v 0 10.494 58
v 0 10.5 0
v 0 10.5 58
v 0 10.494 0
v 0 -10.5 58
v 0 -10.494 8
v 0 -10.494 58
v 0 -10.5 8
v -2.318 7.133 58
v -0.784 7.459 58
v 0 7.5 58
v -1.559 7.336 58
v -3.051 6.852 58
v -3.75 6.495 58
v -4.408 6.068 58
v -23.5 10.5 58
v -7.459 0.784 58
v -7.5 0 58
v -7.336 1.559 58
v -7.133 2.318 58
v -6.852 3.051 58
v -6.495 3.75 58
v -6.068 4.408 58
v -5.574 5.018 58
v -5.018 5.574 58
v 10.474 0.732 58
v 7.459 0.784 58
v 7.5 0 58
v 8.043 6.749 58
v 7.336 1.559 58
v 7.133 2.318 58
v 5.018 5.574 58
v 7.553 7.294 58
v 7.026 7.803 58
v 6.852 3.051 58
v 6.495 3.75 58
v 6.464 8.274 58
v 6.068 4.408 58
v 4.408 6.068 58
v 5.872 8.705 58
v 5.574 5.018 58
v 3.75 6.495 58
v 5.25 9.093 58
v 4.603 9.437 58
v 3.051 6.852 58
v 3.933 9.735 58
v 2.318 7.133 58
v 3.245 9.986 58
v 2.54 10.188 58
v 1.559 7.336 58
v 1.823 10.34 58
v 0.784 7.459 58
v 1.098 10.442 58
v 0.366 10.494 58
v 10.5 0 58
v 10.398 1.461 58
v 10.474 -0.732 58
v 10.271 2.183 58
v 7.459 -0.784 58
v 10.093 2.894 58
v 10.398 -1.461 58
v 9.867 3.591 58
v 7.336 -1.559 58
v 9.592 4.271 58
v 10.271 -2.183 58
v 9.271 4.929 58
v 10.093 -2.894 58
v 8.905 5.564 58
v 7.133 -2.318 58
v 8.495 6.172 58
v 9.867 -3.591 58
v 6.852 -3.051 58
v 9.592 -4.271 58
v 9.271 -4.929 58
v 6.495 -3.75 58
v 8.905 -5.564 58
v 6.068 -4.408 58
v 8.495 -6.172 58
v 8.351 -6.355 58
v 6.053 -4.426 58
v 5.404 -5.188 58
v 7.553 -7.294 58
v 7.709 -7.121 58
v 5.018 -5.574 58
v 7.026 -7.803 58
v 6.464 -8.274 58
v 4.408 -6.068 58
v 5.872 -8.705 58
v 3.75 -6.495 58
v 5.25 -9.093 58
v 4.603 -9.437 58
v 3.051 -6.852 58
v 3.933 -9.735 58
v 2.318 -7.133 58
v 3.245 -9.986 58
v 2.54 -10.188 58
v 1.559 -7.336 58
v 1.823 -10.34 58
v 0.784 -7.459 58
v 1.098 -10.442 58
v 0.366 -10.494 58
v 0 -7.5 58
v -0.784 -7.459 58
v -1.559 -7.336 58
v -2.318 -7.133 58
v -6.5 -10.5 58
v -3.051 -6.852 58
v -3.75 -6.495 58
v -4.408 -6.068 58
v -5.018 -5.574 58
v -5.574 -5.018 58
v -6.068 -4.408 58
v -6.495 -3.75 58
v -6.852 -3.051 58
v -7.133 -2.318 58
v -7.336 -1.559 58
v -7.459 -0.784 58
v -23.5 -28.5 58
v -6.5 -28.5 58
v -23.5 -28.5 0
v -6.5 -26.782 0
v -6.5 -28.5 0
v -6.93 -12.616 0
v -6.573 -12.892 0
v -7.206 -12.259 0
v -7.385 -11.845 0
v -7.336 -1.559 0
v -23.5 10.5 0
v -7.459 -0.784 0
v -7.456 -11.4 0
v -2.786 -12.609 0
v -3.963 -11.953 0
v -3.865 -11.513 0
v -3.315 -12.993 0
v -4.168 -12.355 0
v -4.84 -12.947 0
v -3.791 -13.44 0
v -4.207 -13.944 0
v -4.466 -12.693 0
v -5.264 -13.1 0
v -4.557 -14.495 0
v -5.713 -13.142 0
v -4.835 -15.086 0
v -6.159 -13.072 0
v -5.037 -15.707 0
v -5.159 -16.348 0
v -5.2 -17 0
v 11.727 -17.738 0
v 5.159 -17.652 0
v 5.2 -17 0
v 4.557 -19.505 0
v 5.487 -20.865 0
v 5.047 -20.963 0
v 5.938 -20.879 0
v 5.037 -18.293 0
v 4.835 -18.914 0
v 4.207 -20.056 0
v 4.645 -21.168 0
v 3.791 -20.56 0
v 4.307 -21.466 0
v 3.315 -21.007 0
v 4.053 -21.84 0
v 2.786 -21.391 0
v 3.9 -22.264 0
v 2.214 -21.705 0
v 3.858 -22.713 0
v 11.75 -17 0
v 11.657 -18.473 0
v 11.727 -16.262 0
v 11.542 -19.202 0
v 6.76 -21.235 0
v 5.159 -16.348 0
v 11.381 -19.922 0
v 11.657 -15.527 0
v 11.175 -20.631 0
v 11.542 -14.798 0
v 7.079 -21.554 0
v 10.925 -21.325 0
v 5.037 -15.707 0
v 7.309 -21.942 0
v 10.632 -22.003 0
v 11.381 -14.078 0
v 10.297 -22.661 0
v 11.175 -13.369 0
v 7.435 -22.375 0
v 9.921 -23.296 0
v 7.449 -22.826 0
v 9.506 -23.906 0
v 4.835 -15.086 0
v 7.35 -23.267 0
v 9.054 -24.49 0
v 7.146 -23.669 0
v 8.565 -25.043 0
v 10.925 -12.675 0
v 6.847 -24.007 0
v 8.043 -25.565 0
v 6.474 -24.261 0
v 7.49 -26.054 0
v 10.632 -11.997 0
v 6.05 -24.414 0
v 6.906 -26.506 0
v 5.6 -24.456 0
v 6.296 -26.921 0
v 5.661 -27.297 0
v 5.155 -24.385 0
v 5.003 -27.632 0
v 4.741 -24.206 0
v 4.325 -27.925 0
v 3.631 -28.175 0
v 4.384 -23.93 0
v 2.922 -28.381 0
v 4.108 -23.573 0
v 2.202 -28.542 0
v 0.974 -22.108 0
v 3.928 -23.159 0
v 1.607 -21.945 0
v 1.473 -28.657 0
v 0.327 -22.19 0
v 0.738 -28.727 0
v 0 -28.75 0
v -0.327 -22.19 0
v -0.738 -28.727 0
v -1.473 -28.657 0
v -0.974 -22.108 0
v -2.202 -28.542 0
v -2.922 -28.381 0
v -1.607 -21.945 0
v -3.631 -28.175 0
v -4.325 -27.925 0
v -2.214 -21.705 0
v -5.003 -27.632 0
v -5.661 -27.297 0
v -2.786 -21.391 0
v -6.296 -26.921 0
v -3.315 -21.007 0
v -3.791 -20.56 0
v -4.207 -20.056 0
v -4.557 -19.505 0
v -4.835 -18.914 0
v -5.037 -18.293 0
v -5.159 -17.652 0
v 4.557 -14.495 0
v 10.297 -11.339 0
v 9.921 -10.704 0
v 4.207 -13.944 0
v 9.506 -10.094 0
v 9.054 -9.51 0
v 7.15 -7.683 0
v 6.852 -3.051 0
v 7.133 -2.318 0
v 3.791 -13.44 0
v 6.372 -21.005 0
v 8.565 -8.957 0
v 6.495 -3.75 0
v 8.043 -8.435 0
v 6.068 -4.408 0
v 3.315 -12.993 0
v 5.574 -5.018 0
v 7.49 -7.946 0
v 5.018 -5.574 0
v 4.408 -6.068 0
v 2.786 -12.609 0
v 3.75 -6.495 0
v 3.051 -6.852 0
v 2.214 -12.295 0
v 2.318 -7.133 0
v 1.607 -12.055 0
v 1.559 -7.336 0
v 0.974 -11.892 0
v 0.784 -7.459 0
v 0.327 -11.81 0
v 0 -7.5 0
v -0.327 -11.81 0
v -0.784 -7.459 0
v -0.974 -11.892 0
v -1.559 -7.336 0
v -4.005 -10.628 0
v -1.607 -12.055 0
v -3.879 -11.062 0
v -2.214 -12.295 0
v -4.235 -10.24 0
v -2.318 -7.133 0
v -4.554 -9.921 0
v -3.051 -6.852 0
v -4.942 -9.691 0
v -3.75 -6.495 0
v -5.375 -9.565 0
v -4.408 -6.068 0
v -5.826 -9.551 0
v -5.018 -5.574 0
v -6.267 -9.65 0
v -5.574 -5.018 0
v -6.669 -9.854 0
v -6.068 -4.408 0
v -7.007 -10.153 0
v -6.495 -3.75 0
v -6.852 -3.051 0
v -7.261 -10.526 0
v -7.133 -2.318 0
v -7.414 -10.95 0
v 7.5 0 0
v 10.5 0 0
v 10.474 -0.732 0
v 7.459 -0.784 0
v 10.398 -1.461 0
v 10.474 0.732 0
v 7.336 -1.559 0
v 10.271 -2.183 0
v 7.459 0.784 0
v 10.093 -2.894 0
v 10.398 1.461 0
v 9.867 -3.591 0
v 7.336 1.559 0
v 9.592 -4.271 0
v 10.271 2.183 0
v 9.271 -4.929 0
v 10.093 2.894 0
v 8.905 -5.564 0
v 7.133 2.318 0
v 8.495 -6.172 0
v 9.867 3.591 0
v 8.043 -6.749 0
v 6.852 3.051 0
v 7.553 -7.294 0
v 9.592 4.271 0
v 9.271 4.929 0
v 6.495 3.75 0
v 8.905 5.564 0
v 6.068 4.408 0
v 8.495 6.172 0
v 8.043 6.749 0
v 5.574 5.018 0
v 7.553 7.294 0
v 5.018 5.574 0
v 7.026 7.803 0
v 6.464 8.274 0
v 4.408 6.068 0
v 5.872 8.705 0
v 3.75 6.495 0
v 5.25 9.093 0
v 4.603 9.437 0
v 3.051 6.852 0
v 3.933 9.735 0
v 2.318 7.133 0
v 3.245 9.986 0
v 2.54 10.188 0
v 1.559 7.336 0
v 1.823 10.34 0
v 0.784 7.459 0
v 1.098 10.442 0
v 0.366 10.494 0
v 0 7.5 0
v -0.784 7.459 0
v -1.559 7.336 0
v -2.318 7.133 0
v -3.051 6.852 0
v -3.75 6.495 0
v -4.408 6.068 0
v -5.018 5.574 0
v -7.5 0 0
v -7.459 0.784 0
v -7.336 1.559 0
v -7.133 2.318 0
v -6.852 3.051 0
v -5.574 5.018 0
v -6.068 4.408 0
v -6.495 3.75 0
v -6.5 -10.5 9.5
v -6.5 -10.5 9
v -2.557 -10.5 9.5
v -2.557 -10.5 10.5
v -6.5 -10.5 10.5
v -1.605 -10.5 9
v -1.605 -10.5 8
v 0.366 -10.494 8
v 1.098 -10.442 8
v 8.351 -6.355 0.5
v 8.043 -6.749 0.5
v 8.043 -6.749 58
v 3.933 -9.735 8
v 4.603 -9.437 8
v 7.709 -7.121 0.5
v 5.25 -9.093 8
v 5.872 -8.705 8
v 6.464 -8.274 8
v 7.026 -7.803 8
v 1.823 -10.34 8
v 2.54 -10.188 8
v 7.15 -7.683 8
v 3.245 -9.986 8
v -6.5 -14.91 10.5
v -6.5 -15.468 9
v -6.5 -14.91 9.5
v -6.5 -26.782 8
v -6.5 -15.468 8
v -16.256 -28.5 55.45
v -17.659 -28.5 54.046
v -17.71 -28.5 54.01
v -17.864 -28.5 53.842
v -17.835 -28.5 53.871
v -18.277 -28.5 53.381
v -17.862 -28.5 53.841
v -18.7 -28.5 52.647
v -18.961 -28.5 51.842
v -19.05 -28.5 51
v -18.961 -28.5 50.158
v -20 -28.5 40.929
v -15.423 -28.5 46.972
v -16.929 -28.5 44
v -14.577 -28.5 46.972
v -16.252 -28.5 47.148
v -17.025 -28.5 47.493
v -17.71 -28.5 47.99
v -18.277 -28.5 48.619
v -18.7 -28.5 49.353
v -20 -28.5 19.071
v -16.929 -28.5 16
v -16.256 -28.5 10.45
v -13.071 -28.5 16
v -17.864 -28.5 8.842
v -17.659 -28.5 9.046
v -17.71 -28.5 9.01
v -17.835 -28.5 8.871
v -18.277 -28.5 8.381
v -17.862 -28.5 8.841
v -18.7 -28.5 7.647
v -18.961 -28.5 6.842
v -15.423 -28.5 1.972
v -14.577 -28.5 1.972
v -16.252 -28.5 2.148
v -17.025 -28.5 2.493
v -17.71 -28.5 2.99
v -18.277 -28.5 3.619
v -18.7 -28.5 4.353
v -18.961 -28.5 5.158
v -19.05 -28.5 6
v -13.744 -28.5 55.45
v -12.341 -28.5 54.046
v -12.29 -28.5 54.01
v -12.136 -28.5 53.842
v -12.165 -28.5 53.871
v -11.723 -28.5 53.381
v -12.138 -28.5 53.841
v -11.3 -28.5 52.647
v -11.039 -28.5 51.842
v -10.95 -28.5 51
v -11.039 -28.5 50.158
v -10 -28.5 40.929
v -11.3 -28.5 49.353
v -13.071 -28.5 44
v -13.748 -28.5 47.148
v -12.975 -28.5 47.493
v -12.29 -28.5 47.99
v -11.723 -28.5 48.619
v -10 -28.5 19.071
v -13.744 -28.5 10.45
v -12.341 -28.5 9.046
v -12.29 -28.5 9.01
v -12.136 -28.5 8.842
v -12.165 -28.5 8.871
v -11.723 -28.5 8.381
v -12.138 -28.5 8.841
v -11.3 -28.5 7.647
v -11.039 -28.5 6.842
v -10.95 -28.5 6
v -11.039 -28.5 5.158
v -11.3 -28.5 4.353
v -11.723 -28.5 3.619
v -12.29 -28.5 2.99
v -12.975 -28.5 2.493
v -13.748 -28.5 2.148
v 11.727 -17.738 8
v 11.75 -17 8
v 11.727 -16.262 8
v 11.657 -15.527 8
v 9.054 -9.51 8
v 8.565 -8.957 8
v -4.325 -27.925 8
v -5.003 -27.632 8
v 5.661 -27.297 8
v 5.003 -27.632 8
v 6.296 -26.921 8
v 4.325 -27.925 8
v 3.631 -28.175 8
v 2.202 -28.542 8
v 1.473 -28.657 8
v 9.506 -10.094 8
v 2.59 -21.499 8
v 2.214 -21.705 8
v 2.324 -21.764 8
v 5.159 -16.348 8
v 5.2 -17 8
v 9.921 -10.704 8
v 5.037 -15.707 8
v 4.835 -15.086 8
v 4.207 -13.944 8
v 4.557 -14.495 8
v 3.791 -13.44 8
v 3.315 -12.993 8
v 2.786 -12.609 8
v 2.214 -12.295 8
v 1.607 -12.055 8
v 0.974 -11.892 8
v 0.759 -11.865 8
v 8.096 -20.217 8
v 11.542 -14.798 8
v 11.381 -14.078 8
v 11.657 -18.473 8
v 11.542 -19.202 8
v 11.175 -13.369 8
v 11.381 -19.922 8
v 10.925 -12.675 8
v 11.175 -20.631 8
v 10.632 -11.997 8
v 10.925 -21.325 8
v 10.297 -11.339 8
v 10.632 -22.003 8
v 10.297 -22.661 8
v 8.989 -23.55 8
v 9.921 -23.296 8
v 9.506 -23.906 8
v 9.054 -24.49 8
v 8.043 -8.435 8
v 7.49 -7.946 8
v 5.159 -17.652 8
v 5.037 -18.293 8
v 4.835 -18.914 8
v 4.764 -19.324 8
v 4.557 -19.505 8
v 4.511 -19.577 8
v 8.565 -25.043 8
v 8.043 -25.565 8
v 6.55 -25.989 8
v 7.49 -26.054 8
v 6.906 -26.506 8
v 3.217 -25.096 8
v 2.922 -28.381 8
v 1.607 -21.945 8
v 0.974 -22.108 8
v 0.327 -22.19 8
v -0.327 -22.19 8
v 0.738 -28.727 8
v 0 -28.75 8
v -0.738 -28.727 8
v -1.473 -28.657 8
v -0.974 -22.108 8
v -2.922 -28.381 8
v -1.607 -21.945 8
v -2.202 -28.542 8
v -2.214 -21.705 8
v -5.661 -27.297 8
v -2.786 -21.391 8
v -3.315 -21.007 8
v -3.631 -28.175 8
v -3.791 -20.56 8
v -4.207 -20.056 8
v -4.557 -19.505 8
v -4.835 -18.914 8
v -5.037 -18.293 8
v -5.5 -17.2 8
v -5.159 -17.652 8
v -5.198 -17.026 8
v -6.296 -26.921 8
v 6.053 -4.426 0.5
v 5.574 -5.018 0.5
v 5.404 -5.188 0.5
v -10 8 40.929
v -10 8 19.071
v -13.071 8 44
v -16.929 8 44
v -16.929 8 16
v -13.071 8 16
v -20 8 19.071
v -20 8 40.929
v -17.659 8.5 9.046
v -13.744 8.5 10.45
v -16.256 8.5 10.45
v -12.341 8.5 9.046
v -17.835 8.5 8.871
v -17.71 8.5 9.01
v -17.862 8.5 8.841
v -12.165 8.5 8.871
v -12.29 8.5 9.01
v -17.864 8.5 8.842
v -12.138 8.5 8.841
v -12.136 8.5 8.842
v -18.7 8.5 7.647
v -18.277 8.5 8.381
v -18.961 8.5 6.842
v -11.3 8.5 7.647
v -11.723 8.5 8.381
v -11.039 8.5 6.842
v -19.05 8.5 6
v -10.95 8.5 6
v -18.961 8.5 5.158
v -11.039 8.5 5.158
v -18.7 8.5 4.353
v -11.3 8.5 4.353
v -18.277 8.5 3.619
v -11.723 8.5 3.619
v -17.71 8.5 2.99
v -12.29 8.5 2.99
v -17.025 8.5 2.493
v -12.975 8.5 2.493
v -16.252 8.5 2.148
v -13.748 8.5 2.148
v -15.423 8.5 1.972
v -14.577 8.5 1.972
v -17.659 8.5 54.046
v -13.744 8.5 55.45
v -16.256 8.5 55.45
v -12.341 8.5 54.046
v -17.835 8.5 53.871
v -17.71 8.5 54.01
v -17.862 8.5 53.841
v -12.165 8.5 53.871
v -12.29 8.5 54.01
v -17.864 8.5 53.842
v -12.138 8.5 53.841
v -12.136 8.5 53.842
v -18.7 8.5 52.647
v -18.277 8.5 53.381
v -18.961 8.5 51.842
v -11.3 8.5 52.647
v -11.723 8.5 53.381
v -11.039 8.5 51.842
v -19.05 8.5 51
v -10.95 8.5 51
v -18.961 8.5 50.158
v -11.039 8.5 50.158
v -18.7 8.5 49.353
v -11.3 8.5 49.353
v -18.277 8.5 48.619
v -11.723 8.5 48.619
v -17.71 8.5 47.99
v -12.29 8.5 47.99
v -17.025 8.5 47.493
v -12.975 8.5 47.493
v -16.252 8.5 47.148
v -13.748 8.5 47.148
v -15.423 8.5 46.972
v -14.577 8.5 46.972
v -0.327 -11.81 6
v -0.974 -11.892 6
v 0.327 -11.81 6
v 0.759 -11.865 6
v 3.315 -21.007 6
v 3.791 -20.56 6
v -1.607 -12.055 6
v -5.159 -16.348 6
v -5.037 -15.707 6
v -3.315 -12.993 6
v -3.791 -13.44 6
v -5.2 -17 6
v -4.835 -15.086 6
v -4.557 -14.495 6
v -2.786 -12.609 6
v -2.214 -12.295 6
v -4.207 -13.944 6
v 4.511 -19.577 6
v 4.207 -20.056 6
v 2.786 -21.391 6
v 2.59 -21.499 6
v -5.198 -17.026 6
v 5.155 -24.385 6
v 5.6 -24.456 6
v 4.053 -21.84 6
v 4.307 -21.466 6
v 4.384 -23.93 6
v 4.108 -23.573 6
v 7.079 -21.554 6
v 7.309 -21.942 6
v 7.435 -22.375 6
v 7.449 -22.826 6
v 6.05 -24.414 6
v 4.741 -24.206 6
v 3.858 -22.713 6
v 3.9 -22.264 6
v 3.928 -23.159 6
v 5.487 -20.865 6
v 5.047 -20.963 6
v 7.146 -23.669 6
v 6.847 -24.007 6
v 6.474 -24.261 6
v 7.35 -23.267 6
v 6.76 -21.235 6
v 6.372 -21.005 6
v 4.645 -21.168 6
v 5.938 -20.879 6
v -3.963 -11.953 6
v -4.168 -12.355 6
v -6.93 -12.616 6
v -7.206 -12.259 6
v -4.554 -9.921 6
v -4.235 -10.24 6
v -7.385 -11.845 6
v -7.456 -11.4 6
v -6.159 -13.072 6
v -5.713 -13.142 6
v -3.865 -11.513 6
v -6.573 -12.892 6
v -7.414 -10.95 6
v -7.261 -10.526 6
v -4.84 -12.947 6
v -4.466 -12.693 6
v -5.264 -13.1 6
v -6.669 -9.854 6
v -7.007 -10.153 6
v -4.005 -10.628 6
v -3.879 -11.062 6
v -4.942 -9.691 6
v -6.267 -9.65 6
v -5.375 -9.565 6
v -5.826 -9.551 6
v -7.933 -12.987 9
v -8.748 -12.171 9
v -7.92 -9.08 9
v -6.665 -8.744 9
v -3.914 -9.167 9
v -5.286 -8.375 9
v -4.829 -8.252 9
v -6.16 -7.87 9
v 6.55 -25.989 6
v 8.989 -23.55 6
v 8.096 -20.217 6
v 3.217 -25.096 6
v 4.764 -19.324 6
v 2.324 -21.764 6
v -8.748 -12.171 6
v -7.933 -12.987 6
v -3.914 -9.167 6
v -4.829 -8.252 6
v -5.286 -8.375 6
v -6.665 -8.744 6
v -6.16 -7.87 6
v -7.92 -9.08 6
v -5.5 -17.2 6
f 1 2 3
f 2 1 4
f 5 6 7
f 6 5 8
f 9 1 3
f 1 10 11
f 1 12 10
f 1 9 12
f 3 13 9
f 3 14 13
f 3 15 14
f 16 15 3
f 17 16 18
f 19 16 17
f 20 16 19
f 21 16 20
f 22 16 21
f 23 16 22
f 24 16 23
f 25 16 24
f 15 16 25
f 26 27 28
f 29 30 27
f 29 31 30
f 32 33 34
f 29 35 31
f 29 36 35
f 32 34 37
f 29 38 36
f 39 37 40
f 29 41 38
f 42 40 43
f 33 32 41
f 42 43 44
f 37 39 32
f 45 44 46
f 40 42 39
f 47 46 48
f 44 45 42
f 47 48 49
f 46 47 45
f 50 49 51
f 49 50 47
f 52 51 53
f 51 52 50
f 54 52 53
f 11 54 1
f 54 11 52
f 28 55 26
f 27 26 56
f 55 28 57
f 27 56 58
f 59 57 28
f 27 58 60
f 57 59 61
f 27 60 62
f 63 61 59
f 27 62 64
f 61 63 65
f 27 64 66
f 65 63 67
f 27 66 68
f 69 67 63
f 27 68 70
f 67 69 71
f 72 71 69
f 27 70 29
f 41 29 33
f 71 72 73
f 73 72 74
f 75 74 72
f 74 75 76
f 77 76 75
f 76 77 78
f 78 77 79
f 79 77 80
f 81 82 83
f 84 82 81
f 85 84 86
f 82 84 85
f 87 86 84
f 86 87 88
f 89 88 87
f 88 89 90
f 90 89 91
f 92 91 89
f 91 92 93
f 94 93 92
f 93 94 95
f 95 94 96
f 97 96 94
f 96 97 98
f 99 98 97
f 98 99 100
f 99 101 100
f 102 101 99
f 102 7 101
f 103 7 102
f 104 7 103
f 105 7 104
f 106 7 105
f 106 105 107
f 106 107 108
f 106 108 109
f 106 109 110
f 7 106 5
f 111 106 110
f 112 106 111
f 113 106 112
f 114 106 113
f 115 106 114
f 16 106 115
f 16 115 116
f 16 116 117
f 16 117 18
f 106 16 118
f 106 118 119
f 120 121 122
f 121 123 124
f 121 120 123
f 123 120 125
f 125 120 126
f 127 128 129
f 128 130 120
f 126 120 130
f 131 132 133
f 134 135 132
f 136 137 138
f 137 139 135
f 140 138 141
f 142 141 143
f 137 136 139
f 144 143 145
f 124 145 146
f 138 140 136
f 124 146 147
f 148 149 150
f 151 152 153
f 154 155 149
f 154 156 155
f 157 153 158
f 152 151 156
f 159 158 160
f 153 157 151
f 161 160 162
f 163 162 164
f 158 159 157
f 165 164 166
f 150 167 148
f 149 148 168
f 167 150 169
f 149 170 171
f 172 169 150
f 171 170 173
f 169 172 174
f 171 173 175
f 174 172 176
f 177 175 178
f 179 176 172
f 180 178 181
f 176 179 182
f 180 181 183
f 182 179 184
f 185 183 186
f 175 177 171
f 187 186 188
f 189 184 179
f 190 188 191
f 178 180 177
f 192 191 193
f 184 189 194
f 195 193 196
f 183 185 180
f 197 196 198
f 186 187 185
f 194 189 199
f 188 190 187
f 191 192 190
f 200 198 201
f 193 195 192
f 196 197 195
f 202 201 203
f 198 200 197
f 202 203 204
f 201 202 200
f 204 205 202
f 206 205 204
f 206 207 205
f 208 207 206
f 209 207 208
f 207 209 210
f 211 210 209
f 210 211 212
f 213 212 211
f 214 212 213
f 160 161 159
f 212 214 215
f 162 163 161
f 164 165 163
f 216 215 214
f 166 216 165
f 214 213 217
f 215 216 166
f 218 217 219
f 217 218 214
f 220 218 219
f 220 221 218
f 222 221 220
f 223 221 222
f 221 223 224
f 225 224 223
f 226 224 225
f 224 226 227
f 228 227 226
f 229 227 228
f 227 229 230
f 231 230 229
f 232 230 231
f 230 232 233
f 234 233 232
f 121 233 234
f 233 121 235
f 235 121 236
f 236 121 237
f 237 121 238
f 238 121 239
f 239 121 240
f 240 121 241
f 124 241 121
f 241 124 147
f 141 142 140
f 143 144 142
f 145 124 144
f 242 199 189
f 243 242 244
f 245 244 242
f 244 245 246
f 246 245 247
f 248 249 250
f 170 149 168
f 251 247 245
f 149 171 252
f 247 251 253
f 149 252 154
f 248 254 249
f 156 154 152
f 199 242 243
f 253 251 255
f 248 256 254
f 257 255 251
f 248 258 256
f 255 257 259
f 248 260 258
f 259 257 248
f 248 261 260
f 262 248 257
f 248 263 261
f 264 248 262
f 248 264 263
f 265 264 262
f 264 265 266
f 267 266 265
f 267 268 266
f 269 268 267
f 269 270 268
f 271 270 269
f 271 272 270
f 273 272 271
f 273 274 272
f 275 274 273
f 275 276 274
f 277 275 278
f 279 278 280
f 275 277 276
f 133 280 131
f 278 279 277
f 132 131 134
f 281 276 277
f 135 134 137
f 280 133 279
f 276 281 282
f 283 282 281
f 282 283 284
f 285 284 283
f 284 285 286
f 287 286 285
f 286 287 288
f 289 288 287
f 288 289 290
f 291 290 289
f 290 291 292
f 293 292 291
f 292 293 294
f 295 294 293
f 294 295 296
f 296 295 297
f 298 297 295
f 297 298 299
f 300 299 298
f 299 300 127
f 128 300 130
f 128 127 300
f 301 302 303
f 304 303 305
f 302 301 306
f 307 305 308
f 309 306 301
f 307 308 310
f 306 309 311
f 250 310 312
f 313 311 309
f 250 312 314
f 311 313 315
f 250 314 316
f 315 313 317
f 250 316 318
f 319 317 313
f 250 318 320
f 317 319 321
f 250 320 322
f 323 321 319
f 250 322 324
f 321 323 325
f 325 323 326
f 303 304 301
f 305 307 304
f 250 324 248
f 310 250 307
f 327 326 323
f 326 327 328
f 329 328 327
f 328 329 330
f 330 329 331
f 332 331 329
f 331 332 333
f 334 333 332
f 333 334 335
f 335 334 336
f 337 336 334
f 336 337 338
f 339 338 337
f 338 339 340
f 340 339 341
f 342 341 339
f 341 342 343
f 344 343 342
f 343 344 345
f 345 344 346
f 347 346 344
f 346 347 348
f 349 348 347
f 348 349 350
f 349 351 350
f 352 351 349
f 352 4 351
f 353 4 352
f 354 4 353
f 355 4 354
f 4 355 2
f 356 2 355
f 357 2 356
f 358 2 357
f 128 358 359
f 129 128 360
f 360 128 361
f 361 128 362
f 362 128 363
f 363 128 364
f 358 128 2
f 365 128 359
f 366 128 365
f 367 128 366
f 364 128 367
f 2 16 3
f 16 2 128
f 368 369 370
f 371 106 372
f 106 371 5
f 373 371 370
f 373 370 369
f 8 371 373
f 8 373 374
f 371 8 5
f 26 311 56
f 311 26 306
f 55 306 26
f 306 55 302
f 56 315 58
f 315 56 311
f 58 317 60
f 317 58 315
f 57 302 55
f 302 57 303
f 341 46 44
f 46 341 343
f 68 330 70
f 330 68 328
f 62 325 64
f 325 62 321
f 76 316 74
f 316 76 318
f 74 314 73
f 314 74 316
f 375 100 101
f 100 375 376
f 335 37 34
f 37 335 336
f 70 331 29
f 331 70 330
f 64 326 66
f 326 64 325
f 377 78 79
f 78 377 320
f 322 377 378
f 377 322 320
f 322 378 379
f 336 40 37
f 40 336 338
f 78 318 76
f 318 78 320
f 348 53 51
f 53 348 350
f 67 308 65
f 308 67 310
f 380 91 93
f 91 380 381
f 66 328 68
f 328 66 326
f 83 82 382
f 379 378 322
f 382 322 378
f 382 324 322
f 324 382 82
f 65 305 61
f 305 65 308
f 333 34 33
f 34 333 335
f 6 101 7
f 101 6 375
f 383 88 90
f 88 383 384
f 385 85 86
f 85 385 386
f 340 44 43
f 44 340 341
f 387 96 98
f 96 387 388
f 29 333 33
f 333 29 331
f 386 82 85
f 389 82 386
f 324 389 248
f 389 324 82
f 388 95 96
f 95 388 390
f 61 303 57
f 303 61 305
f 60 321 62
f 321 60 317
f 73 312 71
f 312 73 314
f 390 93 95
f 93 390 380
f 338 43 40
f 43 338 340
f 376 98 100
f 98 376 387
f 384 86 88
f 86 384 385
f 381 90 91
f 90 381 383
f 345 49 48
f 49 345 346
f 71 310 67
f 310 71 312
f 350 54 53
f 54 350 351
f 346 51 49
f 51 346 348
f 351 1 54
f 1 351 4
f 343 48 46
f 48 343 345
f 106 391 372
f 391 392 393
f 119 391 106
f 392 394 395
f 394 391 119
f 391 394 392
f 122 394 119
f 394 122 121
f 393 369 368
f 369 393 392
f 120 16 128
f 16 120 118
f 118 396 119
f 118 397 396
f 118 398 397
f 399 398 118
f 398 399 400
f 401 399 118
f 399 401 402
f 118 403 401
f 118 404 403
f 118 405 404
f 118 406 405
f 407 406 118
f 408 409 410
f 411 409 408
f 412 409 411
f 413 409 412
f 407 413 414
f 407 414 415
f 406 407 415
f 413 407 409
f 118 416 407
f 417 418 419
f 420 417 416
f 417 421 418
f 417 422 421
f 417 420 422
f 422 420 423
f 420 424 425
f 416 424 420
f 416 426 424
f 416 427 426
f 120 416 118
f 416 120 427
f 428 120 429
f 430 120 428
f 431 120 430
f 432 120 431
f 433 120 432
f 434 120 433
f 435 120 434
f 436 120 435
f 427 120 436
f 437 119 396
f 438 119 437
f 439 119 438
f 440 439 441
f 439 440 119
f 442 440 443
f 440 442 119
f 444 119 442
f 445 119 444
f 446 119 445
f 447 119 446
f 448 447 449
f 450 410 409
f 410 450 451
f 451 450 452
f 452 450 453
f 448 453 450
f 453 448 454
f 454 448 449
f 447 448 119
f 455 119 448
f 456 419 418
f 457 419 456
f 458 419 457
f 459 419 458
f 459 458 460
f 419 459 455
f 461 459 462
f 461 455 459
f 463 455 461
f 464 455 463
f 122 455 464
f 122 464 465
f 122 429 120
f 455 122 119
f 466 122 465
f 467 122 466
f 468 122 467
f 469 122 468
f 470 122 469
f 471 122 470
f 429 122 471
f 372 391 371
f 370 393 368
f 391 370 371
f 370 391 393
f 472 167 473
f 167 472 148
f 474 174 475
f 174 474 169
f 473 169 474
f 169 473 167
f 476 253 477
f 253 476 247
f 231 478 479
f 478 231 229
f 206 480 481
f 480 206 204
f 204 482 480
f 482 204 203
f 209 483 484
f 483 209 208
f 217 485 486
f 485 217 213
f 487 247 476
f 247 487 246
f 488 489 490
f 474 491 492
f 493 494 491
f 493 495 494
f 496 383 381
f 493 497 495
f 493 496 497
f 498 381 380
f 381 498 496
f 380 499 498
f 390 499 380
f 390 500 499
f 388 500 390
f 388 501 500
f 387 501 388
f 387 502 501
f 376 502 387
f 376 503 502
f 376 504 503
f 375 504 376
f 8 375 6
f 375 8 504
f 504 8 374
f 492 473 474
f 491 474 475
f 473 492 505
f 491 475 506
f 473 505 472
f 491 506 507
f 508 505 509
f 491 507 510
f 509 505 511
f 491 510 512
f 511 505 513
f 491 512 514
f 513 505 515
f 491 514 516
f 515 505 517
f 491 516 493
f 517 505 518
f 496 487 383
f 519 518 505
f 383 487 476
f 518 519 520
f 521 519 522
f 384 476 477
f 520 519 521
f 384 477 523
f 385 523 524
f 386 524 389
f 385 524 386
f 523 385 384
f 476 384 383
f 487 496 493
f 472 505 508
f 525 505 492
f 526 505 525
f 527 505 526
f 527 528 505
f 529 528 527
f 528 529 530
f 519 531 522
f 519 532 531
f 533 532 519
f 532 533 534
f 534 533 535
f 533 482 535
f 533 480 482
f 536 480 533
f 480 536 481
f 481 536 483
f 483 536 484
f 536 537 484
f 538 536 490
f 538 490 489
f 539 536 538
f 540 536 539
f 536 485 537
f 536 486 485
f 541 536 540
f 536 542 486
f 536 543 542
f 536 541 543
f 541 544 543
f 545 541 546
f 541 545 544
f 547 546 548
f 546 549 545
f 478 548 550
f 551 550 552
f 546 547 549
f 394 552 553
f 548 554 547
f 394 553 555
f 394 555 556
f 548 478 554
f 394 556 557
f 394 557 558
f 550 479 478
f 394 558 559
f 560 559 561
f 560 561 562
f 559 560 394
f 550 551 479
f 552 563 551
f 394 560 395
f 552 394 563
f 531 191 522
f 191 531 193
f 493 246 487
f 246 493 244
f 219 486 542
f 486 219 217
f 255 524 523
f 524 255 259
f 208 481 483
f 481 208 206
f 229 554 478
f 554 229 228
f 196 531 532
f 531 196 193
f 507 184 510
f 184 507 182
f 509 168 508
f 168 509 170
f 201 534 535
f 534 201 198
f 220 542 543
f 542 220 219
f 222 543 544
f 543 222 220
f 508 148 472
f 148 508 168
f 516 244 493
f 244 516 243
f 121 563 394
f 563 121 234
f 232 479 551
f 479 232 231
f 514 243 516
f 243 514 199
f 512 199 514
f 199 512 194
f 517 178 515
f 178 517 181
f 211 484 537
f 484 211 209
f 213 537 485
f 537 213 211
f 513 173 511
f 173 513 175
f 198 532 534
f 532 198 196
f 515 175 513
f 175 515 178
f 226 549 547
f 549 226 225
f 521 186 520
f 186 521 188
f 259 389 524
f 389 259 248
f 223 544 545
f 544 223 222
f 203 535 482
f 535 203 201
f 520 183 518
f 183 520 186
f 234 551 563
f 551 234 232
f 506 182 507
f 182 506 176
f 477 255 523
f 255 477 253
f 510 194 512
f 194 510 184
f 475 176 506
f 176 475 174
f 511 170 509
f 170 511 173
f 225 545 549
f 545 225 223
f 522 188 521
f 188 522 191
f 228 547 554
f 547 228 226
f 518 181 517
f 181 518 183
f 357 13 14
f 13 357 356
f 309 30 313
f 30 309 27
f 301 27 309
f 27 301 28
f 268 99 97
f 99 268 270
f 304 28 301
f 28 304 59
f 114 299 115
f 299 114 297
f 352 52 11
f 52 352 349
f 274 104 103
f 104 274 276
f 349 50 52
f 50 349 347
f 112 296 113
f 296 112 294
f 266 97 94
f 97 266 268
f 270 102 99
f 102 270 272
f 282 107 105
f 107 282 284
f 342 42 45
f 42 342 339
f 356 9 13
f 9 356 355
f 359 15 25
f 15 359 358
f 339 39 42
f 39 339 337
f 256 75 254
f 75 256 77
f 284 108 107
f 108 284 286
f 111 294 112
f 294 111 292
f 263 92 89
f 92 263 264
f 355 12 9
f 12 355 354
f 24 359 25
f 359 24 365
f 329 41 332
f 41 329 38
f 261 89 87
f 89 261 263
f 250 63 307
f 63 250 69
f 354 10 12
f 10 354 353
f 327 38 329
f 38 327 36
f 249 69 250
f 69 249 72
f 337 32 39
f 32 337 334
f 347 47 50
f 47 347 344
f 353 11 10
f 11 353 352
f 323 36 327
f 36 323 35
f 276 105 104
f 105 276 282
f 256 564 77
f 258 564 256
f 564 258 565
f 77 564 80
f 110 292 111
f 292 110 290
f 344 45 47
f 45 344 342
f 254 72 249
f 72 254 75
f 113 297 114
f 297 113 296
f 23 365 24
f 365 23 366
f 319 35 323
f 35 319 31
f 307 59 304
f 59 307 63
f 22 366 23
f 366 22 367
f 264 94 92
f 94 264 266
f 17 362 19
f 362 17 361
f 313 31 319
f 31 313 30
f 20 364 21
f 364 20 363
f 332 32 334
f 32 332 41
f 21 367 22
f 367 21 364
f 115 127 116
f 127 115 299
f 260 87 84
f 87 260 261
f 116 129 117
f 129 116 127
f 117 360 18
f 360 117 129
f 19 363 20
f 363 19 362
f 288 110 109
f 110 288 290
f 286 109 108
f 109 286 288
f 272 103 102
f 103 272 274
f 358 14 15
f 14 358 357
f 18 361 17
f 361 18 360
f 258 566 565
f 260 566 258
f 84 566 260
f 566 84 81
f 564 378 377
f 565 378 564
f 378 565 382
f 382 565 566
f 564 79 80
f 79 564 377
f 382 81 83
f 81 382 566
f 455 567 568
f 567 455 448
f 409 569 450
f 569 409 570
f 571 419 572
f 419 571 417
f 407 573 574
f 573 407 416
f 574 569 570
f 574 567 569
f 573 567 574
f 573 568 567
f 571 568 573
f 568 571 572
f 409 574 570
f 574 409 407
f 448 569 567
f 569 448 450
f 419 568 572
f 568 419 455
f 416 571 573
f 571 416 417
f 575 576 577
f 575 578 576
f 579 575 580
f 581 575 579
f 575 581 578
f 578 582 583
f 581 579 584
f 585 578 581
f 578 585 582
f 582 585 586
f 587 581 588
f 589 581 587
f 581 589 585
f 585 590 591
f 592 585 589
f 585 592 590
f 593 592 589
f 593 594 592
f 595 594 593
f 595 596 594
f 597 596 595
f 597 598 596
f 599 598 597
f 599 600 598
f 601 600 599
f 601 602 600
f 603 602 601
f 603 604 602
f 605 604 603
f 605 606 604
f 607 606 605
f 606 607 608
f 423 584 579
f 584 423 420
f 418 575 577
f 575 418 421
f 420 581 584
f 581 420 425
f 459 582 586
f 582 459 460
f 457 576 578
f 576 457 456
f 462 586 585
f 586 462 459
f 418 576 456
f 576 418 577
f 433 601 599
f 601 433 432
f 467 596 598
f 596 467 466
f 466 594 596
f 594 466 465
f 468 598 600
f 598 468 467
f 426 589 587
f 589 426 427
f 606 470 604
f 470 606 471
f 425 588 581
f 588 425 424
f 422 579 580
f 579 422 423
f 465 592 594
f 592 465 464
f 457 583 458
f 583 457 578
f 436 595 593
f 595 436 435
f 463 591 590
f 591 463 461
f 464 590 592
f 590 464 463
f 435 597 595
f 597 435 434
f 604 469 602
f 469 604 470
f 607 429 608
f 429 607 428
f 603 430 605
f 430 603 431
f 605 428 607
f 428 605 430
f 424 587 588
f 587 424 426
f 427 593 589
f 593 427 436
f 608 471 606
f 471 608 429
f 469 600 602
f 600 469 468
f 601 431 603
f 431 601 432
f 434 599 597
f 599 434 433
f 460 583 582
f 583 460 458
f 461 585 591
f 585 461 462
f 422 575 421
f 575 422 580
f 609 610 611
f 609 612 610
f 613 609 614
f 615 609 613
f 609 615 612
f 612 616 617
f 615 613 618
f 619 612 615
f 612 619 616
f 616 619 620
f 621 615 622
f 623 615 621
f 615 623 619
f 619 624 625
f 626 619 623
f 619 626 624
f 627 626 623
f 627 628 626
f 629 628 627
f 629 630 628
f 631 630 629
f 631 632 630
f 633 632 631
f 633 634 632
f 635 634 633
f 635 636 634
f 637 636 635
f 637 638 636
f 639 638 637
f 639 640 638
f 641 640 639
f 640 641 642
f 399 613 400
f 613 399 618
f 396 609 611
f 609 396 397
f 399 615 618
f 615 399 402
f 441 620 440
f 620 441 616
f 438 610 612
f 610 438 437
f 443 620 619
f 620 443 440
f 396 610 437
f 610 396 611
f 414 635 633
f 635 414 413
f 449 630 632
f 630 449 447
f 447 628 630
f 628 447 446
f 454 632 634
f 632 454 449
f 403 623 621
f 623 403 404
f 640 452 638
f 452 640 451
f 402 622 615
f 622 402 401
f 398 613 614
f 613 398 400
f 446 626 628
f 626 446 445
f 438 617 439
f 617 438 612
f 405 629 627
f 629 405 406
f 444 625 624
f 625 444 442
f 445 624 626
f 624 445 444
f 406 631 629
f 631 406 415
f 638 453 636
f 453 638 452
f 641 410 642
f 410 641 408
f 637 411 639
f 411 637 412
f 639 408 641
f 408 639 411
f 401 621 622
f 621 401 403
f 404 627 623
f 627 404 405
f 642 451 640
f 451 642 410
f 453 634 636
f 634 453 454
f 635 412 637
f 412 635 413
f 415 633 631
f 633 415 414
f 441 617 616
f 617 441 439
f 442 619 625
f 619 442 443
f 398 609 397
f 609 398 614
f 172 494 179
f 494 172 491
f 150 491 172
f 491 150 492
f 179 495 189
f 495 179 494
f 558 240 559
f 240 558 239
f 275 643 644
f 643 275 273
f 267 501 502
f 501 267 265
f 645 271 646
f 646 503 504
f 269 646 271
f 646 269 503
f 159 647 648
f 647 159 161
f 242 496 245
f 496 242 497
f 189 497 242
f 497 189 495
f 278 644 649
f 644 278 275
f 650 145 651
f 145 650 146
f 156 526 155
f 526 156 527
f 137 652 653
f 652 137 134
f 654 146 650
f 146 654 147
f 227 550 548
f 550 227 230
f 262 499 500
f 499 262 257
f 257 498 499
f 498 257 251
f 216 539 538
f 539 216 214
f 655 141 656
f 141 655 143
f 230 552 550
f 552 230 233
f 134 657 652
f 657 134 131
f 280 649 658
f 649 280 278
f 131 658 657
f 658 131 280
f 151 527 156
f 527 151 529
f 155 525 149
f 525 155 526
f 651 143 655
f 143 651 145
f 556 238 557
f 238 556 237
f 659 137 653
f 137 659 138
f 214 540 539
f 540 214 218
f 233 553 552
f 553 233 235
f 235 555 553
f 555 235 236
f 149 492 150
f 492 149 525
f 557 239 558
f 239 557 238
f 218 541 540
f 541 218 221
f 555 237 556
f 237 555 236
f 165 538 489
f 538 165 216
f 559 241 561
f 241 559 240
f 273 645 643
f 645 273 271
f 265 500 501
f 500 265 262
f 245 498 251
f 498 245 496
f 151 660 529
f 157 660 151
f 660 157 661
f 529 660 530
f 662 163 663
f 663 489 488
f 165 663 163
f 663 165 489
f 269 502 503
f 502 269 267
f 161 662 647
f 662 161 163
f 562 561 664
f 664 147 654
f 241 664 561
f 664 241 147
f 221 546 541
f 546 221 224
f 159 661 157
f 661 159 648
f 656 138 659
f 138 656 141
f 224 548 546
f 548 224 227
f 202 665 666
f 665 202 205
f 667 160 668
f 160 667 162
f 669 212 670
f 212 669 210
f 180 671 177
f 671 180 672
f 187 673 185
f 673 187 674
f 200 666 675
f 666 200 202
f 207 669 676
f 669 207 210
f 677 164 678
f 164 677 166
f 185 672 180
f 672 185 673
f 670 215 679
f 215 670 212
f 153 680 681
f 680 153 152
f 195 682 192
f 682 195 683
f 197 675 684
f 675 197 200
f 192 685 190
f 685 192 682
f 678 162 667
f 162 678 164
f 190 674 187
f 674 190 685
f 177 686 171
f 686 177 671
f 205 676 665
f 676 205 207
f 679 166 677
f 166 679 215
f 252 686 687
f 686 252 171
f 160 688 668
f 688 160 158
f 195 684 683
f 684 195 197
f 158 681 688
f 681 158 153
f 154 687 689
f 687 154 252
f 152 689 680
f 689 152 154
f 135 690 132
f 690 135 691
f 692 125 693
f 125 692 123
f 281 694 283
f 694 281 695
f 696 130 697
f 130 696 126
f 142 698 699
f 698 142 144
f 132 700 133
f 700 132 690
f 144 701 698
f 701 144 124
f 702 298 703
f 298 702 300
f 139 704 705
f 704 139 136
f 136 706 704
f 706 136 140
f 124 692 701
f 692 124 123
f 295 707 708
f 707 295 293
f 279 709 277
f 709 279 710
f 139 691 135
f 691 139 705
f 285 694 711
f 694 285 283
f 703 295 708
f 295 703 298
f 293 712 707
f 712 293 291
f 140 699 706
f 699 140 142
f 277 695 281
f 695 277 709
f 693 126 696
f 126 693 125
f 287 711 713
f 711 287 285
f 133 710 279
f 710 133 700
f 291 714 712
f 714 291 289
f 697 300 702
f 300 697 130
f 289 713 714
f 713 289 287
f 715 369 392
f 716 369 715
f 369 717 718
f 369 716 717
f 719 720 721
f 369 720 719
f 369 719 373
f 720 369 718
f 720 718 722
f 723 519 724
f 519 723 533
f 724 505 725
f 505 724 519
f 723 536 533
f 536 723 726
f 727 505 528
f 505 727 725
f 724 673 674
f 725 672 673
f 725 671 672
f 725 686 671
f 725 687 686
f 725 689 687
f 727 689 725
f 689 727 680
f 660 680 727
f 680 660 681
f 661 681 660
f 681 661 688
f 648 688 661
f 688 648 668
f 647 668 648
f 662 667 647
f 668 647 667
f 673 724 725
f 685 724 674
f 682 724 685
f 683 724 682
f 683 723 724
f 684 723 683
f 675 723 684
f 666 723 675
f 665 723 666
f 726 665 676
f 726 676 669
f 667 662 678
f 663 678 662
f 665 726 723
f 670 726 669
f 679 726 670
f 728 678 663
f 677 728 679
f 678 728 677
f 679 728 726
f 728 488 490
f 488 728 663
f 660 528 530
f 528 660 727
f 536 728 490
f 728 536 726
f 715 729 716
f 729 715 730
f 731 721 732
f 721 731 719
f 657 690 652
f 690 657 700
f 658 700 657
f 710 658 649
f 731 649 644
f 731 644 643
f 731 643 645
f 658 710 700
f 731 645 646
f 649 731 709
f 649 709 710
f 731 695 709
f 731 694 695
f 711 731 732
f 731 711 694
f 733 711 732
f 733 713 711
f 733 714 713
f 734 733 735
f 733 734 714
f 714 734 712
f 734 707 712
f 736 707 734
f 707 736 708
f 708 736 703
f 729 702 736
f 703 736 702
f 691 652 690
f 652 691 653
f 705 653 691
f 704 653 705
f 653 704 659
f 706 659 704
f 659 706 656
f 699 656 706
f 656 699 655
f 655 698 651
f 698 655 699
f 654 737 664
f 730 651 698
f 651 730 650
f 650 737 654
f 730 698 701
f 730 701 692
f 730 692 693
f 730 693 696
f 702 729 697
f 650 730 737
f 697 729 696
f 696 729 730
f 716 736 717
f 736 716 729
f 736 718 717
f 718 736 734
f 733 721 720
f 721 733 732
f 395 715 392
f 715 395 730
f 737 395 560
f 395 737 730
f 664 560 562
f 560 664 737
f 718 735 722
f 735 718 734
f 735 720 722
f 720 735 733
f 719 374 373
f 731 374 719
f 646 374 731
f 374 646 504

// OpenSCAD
// file: bearing.scad
// PRUSA iteration3
// Bearing holders
// GNU GPL v3
// Josef Průša <iam@josefprusa.cz> and contributors
// http://www.reprap.org/wiki/Prusa_Mendel
// http://prusamendel.org

bearing_diameter = 15;
thinwall         = 3;
bearing_size     = bearing_diameter + 2 * thinwall;


module horizontal_bearing_base(bearings=1){
    translate(v=[0,0,6]) cube(size = [24,8+bearings*25,12], center = true);	
}

module horizontal_bearing_holes(bearings=1){
    cutter_lenght     = 10+bearings*25;
    one_holder_lenght = 8+25;
    holder_lenght     = 8+bearings*25;
 
    //Main bearing cut
    difference(){
        translate(v=[0,0,12]) rotate(a=[90,0,0]) translate(v=[0,0,-cutter_lenght/2]) cylinder(h = cutter_lenght, r=bearing_diameter/2, $fn=50);
        
        //Bearing retainers
        translate(v=[0,1-holder_lenght/2,3]) cube(size = [24,6,8], center = true);
        translate(v=[0,-1+holder_lenght/2,3]) cube(size = [24,6,8], center = true);
    }
 
    //Ziptie cutouts
    ziptie_cut_ofset = 0;

    for (i = [0 : bearings-1]){
        // For easier positioning I move them by half of one 
        // bearing holder then add each bearign lenght and then center again
        translate(v=[0,-holder_lenght/2,0]) translate(v=[0,one_holder_lenght/2+i*25,0]) difference(){
            union(){
                translate(v=[0,2-6,12]) rotate(a=[90,0,0]) translate(v=[0,0,0]) cylinder(h = 4, r=12.5, $fn=50);
                translate(v=[0,2+6,12]) rotate(a=[90,0,0]) translate(v=[0,0,0]) cylinder(h = 4, r=12.5, $fn=50);
            }
            translate(v=[0,10,12]) rotate(a=[90,0,0]) translate(v=[0,0,0]) cylinder(h = 24, r=10, $fn=50);
        }
    }
}

module horizontal_bearing_test(){
    difference(){
        horizontal_bearing_base(1);
        horizontal_bearing_holes(1);
    }
    translate(v=[30,0,0]) difference(){
        horizontal_bearing_base(2);
        horizontal_bearing_holes(2);
    }

    translate(v=[60,0,0]) difference(){
        horizontal_bearing_base(3);
        horizontal_bearing_holes(3);
    }
}

module vertical_bearing_base(){
    translate(v=[-2-bearing_size/4,0,29]) cube(size = [4+bearing_size/2,bearing_size,58], center = true);
    cylinder(h = 58, r=bearing_size/2, $fn = 90);
}

module vertical_bearing_holes(){
    translate(v=[0,0,-1]) cylinder(h = 62, r=bearing_diameter/2, $fn = 60);
   # rotate(a=[0,0,-40]) translate(v=[8,0,31.5]) cube(size = [5,1,62], center = true);
}

//Final part
difference(){
    vertical_bearing_base();
    vertical_bearing_holes();
}
// main file
// PRUSA iteration3
// X end prototype
// GNU GPL v3
// Josef Průša <iam@josefprusa.cz> and contributors
// http://www.reprap.org/wiki/Prusa_Mendel
// http://prusamendel.org

use <bearing.scad>

rod_distance = 45;


module x_end_base(){
	//Main block
	height = 58;
	translate(v=[-15,-9,height/2]) cube(size = [17,39,height], center = true);
	
	//Bearing holder
 	vertical_bearing_base();	
	
    translate(v=[-6,-10.6,10]) rotate([0,0,48.2]) cube(size = [10,5,1], center = true);
	//Nut trap
 	translate(v=[0,-17,0]) cylinder(h = 8, r=23.5/2, $fn=100);
}

module x_end_holes(){
    vertical_bearing_holes();
    
    //Belt hole
    translate(v=[-1,0,0]) difference(){
	   translate(v=[-5.5-10+1.5,-15,30]) cube(size = [10,46,28], center = true);
    	// Nice edges
    	translate(v=[-5.5-10+1.5,-10,30+23]) rotate([0,45,0]) cube(size = [10,46,28], center = true);
    	translate(v=[-5.5-10+1.5,-10,30+23]) rotate([0,-45,0]) cube(size = [10,46,28], center = true);
    	translate(v=[-5.5-10+1.5,-10,30-23]) rotate([0,45,0]) cube(size = [10,46,28], center = true);
    	translate(v=[-5.5-10+1.5,-10,30-23]) rotate([0,-45,0]) cube(size = [10,46,28], center = true);

    }

    //Bottom pushfit rod
    translate(v=[-15,-41.5,6]) rotate(a=[-90,0,0]) pushfit_rod(8.1,50);

    //Top pushfit rod
    translate(v=[-15,-41.5,rod_distance+6]) rotate(a=[-90,0,0]) pushfit_rod(8.1,50);
    
    //Nut trap
    
    // Hole for the nut
    translate(v=[0,-17, -1]) cylinder(h = 9.01, r = 10/2+0.2, $fn = 50);
    
    // Screw holes for TR nut
    translate(v=[0,-17, 0]) rotate([0, 0, -135]) translate([0, 8, -1]) cylinder(h = 10, r = 1.8, $fn=25);
    translate(v=[0,-17, 0]) rotate([0, 0, -135]) translate([0, -8, -1]) cylinder(h = 10, r = 1.8, $fn=25);
    
    
    translate(v=[0,-17, 0]) rotate([0, 0, -135]) translate([0, 8, 6]) rotate([0, 0, 0])cylinder(h = 3, r = 3.45, $fn=6);

    translate(v=[0,-17, 0]) rotate([0, 0, -135]) translate([0, -8, 6]) rotate([0, 0, 30])cylinder(h = 3, r = 3.2, $fn=6);
    translate([-5.5,-17.2,6]) rotate([0,0,30]) cube([5,5,3]);
    translate([-0,-17.2,6]) rotate([0,0,60]) cube([5,10,3]);
}

module pushfit_rod(diameter,length){
    cylinder(h = length, r=diameter/2, $fn=30);
    difference(){
        translate(v=[0,-diameter/2.85,length/2]) rotate([0,0,45]) cube(size = [diameter/2,diameter/2,length], center = true);
        translate(v=[0,-diameter/4-diameter/2-0.4,length/2]) rotate([0,0,0]) cube(size = [diameter,diameter/2,length], center = true);
    }
}

//Final part
module x_end_plain(){
    difference(){
        x_end_base();
        x_end_holes();
    }
}

x_end_plain();
